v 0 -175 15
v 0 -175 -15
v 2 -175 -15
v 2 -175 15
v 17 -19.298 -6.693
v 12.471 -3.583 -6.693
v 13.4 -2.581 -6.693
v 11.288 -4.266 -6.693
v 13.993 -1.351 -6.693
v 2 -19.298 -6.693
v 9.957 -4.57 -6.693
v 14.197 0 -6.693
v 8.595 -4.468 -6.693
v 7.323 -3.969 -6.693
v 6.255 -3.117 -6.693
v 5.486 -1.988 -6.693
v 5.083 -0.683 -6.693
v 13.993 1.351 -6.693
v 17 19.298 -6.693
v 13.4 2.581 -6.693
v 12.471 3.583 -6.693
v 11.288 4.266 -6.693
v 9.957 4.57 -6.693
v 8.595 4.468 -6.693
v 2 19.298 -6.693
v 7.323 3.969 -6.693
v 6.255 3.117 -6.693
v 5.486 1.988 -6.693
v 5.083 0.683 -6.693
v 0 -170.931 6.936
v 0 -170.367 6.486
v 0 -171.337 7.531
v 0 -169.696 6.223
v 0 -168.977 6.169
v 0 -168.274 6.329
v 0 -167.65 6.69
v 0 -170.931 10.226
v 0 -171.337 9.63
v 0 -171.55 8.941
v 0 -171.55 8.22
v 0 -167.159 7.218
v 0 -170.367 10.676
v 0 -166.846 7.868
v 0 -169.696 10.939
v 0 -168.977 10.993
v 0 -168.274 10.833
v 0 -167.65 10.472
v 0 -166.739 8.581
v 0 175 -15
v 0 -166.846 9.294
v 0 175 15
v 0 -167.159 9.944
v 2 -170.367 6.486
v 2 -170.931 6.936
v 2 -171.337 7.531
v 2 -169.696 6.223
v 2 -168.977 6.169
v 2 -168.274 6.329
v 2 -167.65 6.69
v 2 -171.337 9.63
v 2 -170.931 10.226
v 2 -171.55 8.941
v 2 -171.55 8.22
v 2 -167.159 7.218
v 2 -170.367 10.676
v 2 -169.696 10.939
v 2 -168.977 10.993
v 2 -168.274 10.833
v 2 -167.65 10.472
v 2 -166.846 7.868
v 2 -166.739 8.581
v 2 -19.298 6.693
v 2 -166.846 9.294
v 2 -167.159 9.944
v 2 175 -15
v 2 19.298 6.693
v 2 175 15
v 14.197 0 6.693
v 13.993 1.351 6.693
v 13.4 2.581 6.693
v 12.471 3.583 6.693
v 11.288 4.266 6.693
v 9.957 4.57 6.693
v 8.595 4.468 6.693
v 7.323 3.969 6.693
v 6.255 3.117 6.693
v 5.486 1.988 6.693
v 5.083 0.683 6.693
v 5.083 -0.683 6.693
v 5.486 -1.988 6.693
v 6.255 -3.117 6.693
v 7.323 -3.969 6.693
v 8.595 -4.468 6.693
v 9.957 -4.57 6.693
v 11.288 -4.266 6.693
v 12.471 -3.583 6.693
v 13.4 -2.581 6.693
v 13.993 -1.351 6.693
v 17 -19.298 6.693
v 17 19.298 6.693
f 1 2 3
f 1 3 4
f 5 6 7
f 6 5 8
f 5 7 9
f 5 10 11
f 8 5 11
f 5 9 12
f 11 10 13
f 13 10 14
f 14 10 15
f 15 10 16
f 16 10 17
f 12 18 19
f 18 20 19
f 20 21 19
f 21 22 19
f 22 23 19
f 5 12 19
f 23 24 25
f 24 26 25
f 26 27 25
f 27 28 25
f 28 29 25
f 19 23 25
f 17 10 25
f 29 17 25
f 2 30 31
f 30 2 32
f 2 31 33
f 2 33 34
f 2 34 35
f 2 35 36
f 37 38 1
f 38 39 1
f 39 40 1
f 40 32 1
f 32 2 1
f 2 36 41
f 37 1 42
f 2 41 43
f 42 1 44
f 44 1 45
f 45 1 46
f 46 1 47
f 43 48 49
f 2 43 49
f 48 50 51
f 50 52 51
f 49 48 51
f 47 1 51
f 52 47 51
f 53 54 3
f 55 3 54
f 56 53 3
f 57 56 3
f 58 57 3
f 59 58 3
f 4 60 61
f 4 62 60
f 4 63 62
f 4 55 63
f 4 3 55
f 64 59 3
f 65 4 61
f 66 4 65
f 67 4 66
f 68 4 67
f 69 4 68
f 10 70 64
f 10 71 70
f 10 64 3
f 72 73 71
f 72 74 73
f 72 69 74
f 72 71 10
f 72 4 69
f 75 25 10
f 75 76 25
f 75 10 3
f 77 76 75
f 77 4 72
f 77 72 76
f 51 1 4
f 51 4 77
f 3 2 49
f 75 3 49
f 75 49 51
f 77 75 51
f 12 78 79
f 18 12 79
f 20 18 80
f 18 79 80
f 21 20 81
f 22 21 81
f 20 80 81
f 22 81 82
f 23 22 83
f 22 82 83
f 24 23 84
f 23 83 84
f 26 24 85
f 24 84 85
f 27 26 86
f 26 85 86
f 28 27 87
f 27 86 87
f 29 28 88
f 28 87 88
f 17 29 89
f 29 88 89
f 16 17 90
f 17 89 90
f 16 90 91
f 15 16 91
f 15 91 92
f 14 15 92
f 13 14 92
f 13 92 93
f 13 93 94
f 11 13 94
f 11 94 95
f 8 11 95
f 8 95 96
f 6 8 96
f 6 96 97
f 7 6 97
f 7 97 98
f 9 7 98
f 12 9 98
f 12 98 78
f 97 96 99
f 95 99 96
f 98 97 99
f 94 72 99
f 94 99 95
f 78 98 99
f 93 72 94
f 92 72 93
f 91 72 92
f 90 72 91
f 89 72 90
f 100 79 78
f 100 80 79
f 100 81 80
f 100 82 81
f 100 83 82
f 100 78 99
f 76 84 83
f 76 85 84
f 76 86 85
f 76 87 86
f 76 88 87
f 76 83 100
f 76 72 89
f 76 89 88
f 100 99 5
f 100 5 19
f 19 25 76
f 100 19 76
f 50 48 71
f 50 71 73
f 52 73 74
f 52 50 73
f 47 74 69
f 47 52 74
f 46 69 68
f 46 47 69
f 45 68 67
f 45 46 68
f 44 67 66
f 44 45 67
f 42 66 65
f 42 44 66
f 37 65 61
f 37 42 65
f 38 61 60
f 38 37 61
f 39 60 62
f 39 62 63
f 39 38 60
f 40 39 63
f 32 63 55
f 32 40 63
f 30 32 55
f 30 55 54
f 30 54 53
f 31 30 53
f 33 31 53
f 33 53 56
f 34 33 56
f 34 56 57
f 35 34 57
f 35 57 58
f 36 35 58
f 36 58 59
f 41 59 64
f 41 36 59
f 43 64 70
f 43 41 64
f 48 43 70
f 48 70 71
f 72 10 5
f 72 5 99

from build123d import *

# Parameters (mm, degrees)
F0_W     = 350
F0_H     = 30
F0_R     = 2.418964
F1_DEPTH = 2
F2_W     = 38.596436
F2_H     = 13.385396
F3_DEPTH = 15
F4_R     = 4.582497
F5_DEPTH = 21.693698


with BuildPart() as f1:
    # F0 (on Right) → F1 (new body)
    with BuildSketch(Plane.YZ):
        Rectangle(F0_W, F0_H)
        with Locations((-169.157952, 8.580949)):
            Circle(F0_R, mode=Mode.SUBTRACT)
    extrude(amount=F1_DEPTH)

    # F2 (on face) → F3 (join)
    with BuildSketch(Plane.YZ.offset(2)):
        Rectangle(F2_W, F2_H)
    extrude(amount=F3_DEPTH)

    # F4 (on face) → F5 (cut, through all)
    with BuildSketch(Plane.XY.offset(6.692698)):
        with Locations((9.614242, 0)):
            Circle(F4_R)
    extrude(amount=-F5_DEPTH, mode=Mode.SUBTRACT)


solid = f1.part
